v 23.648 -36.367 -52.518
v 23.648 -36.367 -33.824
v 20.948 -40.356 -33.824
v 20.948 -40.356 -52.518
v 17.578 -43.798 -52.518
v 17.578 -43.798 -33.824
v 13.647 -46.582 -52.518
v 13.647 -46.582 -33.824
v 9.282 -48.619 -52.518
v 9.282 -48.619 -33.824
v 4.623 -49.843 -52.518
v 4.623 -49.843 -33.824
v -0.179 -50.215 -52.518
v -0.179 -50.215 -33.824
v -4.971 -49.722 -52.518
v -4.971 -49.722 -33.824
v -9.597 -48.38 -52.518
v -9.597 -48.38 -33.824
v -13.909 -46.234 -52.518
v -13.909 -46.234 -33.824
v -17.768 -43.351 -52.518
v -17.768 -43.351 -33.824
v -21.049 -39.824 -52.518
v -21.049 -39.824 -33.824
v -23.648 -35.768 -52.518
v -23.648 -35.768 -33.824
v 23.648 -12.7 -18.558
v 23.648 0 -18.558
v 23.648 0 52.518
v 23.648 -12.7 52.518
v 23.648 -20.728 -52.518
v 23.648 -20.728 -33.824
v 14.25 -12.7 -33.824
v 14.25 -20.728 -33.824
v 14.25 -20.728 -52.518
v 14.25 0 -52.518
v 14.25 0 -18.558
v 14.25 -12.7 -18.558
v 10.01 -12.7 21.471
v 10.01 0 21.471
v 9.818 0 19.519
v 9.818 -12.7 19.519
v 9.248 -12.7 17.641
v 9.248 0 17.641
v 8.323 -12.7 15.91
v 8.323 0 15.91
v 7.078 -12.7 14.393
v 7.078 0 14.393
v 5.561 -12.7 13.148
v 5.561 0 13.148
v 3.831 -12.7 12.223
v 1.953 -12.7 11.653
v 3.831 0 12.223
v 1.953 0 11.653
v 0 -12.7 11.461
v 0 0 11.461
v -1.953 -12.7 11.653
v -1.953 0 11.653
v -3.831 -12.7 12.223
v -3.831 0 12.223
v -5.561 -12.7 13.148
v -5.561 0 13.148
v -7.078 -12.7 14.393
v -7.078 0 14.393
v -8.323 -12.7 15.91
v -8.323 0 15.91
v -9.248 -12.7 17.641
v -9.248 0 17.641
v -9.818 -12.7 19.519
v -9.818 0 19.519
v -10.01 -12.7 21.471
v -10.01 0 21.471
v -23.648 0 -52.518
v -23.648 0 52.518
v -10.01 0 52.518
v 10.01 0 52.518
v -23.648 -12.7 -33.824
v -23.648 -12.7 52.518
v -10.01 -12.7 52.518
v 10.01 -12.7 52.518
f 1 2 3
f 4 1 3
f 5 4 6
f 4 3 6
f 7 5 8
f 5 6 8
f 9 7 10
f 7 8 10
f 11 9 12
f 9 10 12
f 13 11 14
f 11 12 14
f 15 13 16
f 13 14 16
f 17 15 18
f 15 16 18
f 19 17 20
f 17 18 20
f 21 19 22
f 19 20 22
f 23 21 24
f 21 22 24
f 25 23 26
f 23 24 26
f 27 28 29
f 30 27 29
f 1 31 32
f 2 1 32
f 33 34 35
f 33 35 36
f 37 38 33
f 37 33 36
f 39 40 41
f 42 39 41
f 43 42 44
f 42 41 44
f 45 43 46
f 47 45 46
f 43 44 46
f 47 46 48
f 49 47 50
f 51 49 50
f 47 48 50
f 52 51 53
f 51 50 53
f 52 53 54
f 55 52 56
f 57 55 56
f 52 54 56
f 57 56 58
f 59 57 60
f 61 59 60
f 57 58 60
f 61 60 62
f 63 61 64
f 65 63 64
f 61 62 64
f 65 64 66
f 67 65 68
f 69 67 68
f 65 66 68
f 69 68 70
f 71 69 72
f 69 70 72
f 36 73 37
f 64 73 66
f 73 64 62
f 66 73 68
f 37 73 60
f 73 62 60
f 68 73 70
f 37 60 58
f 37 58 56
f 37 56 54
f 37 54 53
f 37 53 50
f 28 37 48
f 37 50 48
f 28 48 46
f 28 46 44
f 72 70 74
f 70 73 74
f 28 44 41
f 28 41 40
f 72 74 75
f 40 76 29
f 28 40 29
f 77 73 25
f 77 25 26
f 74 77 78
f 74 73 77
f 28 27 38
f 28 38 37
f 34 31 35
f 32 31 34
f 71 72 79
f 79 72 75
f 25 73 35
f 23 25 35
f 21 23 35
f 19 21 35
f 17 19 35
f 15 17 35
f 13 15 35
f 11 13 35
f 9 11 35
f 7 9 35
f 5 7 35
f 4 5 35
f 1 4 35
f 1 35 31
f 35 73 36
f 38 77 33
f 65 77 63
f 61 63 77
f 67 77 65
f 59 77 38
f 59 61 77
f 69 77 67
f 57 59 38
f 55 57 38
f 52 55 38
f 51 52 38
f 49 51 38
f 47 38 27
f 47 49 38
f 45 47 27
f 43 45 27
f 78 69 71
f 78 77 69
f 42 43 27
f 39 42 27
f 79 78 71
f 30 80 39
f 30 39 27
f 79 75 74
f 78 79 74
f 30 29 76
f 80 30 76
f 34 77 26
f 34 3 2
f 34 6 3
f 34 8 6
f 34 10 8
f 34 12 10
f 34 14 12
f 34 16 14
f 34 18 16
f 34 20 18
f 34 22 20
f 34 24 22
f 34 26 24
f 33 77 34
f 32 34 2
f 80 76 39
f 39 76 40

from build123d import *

# Parameters (mm, degrees)
F1_DEPTH = 12.7
F2_W     = 47.2951717675
F2_H     = 18.6941325665
F3_DEPTH = 38.354
F5_DEPTH = 25.4
F6_W     = 20.7277107984
F6_H     = 33.9597482234
F7_DEPTH = 9.398


with BuildPart() as f1:
    # F0 (on Front) → F1 (new body)
    with BuildSketch(Plane.XZ):
        with BuildLine():
            Line((-10.0103262812, 52.5179617107), (-23.6475858837, 52.5179617107))
            Line((-23.6475858837, 52.5179617107), (-23.6475858837, -52.5179617107))
            Line((-23.6475858837, -52.5179617107), (23.6475858837, -52.5179617107))
            Line((23.6475858837, -52.5179617107), (23.6475858837, 52.5179617107))
            Line((23.6475858837, 52.5179617107), (10.0103300065, 52.5179617107))
            Line((10.0103300065, 52.5179617107), (10.0103300065, 21.4714333415))
            ThreePointArc((10.0103300065, 21.4714333415), (1.8626e-06, 11.4611051977), (-10.0103262812, 21.4714333415))
            Line((-10.0103262812, 21.4714333415), (-10.0103262812, 52.5179617107))
        make_face()
    extrude(amount=F1_DEPTH)

    # F2 (on face) → F3 (join)
    with BuildSketch(Plane.XZ.offset(12.7)):
        with Locations((0, -43.1708954275)):
            Rectangle(F2_W, F2_H)
    extrude(amount=F3_DEPTH)

    # F4 (on face) → F5 (cut)
    with BuildSketch(Plane.XY.offset(-33.8238291442)):
        with BuildLine():
            ThreePointArc((23.6475858837, -36.3668836653), (-0.1790720486, -50.2147851715), (-23.6475858837, -35.7682332397))
            Line((-23.6475858837, -35.7682332397), (-23.6475858837, -51.054))
            Line((-23.6475858837, -51.054), (23.6475858837, -51.054))
            Line((23.6475858837, -51.054), (23.6475858837, -36.3668836653))
        make_face()
    extrude(amount=-F5_DEPTH, mode=Mode.SUBTRACT)

    # F6 (on face) → F7 (cut)
    with BuildSketch(Plane.YZ.offset(23.6475858837)):
        with Locations((-10.3638553992, -35.538087599)):
            Rectangle(F6_W, F6_H)
    extrude(amount=-F7_DEPTH, mode=Mode.SUBTRACT)


solid = f1.part
